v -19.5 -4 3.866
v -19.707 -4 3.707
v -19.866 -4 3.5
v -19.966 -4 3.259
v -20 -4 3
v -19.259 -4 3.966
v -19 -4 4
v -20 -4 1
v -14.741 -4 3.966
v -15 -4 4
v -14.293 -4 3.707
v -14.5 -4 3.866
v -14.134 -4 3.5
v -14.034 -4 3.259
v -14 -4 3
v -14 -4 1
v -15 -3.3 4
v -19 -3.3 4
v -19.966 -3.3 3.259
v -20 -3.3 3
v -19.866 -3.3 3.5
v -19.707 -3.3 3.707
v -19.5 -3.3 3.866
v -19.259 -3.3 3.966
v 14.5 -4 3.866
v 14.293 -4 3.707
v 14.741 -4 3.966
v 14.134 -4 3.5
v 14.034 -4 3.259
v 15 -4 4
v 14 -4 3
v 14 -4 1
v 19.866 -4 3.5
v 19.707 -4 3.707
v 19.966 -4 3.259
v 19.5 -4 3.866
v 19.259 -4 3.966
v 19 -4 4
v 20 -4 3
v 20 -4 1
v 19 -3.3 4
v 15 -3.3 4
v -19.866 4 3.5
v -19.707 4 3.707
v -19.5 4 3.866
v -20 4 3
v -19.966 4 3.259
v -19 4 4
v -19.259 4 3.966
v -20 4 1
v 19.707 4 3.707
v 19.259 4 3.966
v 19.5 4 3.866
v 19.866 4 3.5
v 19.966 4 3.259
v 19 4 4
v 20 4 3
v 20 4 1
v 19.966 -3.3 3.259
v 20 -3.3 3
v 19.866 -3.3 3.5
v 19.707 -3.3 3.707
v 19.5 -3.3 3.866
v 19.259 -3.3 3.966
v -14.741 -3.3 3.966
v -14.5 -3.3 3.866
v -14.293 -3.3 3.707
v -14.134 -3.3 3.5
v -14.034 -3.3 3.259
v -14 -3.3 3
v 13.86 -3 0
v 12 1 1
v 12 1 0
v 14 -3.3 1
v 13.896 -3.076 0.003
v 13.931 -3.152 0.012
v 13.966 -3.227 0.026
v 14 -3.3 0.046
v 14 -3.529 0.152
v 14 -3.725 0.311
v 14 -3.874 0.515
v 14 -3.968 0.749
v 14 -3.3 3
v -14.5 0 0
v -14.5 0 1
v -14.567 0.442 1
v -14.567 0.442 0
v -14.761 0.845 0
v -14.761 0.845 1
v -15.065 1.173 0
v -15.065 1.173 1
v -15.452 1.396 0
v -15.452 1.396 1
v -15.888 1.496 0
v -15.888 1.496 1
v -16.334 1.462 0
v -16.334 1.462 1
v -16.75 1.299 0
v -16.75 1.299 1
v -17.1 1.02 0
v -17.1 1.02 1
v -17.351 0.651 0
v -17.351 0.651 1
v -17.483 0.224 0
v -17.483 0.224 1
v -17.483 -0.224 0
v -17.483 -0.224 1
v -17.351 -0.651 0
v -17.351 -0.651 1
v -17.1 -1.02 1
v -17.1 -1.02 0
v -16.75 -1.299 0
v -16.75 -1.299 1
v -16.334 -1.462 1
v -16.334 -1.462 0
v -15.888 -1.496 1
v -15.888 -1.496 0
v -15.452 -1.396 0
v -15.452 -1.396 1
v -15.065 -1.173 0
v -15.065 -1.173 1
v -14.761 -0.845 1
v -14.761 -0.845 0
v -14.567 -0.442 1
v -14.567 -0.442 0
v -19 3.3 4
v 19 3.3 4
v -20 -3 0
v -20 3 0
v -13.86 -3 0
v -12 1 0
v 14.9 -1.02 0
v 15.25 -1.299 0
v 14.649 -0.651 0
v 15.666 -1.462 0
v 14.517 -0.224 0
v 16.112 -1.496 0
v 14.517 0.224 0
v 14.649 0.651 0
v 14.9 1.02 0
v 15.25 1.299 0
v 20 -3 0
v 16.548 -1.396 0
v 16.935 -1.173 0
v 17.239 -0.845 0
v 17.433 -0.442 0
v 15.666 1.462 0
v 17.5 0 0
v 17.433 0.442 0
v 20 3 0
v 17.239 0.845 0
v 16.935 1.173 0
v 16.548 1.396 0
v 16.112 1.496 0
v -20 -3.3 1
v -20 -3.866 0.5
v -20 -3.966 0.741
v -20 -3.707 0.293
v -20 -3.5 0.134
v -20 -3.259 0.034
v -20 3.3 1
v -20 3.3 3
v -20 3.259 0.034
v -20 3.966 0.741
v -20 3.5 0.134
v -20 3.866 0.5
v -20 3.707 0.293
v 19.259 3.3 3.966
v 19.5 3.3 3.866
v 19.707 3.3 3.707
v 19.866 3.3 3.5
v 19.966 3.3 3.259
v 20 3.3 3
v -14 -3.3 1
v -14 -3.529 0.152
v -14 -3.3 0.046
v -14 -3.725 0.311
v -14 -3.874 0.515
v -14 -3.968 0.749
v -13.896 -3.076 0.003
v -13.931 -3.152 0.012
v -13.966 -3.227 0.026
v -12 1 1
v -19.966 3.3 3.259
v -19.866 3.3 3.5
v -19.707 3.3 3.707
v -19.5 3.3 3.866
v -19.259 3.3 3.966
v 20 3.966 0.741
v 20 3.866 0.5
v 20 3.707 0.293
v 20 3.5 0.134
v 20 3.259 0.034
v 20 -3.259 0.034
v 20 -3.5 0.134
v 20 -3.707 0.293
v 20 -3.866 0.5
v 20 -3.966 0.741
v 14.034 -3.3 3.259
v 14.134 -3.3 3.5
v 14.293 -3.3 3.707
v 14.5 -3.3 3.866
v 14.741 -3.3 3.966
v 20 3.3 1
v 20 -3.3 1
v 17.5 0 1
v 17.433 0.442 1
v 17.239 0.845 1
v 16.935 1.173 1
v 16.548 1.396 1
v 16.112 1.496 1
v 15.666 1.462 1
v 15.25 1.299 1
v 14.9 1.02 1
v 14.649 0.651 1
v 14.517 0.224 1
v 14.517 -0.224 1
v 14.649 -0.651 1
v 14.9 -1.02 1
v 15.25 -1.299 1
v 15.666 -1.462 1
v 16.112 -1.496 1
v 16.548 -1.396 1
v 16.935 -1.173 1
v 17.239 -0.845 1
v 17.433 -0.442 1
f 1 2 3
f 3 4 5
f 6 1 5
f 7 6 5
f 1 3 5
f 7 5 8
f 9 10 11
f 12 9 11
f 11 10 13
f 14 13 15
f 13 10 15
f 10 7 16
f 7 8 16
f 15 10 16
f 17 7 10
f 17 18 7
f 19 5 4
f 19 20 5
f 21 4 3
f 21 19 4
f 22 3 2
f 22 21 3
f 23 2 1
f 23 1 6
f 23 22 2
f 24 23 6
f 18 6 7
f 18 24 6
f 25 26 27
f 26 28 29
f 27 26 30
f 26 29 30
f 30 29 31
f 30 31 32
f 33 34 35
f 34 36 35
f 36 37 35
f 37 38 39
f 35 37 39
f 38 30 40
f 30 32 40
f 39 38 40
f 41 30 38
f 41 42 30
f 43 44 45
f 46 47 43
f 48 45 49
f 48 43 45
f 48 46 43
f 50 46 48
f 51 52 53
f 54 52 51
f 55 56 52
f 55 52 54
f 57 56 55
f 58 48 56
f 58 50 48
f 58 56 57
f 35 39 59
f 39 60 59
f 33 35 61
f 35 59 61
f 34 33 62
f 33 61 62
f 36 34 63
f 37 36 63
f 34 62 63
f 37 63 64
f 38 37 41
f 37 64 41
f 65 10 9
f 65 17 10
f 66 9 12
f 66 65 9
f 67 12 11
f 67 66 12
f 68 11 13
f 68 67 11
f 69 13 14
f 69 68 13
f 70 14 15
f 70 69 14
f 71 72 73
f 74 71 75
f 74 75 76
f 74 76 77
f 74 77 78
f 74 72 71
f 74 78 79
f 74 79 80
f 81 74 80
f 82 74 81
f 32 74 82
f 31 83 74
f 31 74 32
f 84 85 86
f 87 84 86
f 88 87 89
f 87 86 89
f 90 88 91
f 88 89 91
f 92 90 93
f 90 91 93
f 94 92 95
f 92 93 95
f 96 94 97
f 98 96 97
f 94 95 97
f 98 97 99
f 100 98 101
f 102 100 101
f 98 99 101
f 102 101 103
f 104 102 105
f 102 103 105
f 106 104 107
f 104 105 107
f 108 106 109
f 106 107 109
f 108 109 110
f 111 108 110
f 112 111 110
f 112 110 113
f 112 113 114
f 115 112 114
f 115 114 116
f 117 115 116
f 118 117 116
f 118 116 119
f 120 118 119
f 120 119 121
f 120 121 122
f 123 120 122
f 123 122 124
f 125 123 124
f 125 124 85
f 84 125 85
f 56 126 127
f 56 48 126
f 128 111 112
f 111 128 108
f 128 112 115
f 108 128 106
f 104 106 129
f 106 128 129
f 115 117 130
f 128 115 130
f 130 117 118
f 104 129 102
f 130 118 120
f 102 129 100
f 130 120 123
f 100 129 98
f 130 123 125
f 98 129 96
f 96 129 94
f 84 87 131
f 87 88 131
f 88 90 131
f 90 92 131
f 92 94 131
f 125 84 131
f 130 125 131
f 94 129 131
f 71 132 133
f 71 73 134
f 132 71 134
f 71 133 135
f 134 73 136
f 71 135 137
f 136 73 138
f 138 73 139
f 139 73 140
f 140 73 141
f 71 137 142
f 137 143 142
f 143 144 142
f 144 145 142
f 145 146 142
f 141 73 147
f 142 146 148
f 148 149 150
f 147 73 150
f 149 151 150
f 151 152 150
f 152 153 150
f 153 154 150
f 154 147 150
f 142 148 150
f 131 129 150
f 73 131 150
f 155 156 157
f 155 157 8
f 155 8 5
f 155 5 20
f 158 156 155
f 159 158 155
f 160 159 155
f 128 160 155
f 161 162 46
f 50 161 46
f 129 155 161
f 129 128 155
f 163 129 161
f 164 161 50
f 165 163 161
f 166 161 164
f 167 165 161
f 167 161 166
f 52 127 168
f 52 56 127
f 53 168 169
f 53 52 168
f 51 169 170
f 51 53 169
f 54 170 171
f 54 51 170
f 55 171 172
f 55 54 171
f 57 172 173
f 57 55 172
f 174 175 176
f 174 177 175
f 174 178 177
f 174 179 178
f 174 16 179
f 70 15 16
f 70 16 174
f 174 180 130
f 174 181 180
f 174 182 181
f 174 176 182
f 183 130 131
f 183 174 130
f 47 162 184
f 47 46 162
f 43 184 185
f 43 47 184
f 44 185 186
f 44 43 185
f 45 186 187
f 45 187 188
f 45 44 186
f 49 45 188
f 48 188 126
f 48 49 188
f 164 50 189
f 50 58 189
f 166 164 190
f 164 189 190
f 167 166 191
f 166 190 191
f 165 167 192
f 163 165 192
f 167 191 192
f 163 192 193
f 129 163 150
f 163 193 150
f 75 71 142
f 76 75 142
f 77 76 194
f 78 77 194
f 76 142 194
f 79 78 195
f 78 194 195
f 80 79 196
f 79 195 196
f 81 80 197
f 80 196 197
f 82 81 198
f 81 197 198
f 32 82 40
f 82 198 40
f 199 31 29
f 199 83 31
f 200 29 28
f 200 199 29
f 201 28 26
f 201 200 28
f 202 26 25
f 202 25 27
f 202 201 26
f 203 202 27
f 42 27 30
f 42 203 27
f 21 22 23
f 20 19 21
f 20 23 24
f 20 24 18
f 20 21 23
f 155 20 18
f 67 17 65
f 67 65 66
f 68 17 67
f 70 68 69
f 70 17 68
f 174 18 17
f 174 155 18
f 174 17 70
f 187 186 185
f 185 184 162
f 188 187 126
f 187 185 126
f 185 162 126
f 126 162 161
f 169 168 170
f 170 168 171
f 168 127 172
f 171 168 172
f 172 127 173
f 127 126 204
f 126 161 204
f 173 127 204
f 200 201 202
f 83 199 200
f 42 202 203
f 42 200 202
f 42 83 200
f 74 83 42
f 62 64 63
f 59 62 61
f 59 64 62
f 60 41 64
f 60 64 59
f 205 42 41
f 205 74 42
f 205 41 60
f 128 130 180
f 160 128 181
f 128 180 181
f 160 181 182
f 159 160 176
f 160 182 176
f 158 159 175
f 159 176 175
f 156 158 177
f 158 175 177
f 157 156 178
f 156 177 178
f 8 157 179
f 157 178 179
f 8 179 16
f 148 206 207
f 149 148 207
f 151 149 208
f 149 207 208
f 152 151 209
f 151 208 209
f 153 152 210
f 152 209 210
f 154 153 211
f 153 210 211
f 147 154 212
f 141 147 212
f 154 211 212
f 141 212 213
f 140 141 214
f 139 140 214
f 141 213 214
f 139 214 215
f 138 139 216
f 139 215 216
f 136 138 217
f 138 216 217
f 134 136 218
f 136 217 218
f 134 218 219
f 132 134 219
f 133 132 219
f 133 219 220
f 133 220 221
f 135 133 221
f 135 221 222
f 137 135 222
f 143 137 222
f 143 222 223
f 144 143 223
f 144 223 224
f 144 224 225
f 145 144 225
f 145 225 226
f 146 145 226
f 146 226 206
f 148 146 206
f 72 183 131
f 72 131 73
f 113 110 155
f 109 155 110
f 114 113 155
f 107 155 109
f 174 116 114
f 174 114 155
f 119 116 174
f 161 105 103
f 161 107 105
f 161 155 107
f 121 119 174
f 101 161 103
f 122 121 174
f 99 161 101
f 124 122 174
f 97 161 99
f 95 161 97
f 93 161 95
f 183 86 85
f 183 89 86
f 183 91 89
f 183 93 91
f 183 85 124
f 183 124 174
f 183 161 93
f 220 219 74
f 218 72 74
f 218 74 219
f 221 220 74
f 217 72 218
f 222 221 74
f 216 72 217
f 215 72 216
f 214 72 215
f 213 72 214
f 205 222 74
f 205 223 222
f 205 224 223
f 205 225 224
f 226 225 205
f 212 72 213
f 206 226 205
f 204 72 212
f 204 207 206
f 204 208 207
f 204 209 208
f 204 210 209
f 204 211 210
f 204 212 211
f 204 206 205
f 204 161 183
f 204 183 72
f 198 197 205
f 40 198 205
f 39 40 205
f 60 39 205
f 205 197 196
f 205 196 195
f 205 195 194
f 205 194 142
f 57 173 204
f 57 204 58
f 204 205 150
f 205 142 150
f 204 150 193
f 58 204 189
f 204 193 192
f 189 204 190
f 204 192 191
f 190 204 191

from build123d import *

# Parameters (mm, degrees)
SKETCH1_W           = 40
SKETCH1_H           = 8
BOSS_EXTRUDE1_DEPTH = 1
SKETCH2_W           = 6
SKETCH2_H           = 0.7
BOSS_EXTRUDE2_DEPTH = 3
SKETCH3_W           = 40
SKETCH3_H           = 0.7
BOSS_EXTRUDE3_DEPTH = 3
CUT_EXTRUDE2_DEPTH  = 3
SKETCH5_R           = 1.5
CUT_EXTRUDE3_DEPTH  = 3
FILLET1_R           = 1


with BuildPart() as part:
    # Sketch1 → Boss-Extrude1 (new body)
    with BuildSketch(Plane.XY):
        Rectangle(SKETCH1_W, SKETCH1_H)
    extrude(amount=BOSS_EXTRUDE1_DEPTH)

    # Sketch2 → Boss-Extrude2 (add)
    with BuildSketch(Plane.XY.offset(1)):
        with Locations((-17, -3.65)):
            Rectangle(SKETCH2_W, SKETCH2_H)
        with Locations((17, -3.65)):
            Rectangle(SKETCH2_W, SKETCH2_H)
    extrude(amount=BOSS_EXTRUDE2_DEPTH)

    # Sketch3 → Boss-Extrude3 (add)
    with BuildSketch(Plane.XY.offset(1)):
        with Locations((0, 3.65)):
            Rectangle(SKETCH3_W, SKETCH3_H)
    extrude(amount=BOSS_EXTRUDE3_DEPTH)

    # Sketch4 → Cut-Extrude2 (cut)
    with BuildSketch(Plane.XY.offset(1)):
        Polygon((-12, 1), (12, 1), (14, -3.3), (14, -4), (-14, -4), (-14, -3.3), align=None)
    extrude(amount=-CUT_EXTRUDE2_DEPTH, mode=Mode.SUBTRACT)

    # Sketch5 → Cut-Extrude3 (cut)
    with BuildSketch(Plane.XY.offset(1)):
        with Locations((16, 0)):
            Circle(SKETCH5_R)
        with Locations((-16, 0)):
            Circle(SKETCH5_R)
    extrude(amount=-CUT_EXTRUDE3_DEPTH, mode=Mode.SUBTRACT)

    # Fillet1
    fillet1_edges = [part.edges().sort_by_distance(p)[0] for p in [
        (-14, -3.65, 4),
        (-20, -3.65, 4),
        (14, -3.65, 4),
        (20, -3.65, 4),
        (20, 3.65, 4),
        (-20, 3.65, 4),
        (17, -4, 0),
        (-17, -4, 0),
        (0, 4, 0),
    ]]
    fillet(fillet1_edges, radius=FILLET1_R)


solid = part.part
